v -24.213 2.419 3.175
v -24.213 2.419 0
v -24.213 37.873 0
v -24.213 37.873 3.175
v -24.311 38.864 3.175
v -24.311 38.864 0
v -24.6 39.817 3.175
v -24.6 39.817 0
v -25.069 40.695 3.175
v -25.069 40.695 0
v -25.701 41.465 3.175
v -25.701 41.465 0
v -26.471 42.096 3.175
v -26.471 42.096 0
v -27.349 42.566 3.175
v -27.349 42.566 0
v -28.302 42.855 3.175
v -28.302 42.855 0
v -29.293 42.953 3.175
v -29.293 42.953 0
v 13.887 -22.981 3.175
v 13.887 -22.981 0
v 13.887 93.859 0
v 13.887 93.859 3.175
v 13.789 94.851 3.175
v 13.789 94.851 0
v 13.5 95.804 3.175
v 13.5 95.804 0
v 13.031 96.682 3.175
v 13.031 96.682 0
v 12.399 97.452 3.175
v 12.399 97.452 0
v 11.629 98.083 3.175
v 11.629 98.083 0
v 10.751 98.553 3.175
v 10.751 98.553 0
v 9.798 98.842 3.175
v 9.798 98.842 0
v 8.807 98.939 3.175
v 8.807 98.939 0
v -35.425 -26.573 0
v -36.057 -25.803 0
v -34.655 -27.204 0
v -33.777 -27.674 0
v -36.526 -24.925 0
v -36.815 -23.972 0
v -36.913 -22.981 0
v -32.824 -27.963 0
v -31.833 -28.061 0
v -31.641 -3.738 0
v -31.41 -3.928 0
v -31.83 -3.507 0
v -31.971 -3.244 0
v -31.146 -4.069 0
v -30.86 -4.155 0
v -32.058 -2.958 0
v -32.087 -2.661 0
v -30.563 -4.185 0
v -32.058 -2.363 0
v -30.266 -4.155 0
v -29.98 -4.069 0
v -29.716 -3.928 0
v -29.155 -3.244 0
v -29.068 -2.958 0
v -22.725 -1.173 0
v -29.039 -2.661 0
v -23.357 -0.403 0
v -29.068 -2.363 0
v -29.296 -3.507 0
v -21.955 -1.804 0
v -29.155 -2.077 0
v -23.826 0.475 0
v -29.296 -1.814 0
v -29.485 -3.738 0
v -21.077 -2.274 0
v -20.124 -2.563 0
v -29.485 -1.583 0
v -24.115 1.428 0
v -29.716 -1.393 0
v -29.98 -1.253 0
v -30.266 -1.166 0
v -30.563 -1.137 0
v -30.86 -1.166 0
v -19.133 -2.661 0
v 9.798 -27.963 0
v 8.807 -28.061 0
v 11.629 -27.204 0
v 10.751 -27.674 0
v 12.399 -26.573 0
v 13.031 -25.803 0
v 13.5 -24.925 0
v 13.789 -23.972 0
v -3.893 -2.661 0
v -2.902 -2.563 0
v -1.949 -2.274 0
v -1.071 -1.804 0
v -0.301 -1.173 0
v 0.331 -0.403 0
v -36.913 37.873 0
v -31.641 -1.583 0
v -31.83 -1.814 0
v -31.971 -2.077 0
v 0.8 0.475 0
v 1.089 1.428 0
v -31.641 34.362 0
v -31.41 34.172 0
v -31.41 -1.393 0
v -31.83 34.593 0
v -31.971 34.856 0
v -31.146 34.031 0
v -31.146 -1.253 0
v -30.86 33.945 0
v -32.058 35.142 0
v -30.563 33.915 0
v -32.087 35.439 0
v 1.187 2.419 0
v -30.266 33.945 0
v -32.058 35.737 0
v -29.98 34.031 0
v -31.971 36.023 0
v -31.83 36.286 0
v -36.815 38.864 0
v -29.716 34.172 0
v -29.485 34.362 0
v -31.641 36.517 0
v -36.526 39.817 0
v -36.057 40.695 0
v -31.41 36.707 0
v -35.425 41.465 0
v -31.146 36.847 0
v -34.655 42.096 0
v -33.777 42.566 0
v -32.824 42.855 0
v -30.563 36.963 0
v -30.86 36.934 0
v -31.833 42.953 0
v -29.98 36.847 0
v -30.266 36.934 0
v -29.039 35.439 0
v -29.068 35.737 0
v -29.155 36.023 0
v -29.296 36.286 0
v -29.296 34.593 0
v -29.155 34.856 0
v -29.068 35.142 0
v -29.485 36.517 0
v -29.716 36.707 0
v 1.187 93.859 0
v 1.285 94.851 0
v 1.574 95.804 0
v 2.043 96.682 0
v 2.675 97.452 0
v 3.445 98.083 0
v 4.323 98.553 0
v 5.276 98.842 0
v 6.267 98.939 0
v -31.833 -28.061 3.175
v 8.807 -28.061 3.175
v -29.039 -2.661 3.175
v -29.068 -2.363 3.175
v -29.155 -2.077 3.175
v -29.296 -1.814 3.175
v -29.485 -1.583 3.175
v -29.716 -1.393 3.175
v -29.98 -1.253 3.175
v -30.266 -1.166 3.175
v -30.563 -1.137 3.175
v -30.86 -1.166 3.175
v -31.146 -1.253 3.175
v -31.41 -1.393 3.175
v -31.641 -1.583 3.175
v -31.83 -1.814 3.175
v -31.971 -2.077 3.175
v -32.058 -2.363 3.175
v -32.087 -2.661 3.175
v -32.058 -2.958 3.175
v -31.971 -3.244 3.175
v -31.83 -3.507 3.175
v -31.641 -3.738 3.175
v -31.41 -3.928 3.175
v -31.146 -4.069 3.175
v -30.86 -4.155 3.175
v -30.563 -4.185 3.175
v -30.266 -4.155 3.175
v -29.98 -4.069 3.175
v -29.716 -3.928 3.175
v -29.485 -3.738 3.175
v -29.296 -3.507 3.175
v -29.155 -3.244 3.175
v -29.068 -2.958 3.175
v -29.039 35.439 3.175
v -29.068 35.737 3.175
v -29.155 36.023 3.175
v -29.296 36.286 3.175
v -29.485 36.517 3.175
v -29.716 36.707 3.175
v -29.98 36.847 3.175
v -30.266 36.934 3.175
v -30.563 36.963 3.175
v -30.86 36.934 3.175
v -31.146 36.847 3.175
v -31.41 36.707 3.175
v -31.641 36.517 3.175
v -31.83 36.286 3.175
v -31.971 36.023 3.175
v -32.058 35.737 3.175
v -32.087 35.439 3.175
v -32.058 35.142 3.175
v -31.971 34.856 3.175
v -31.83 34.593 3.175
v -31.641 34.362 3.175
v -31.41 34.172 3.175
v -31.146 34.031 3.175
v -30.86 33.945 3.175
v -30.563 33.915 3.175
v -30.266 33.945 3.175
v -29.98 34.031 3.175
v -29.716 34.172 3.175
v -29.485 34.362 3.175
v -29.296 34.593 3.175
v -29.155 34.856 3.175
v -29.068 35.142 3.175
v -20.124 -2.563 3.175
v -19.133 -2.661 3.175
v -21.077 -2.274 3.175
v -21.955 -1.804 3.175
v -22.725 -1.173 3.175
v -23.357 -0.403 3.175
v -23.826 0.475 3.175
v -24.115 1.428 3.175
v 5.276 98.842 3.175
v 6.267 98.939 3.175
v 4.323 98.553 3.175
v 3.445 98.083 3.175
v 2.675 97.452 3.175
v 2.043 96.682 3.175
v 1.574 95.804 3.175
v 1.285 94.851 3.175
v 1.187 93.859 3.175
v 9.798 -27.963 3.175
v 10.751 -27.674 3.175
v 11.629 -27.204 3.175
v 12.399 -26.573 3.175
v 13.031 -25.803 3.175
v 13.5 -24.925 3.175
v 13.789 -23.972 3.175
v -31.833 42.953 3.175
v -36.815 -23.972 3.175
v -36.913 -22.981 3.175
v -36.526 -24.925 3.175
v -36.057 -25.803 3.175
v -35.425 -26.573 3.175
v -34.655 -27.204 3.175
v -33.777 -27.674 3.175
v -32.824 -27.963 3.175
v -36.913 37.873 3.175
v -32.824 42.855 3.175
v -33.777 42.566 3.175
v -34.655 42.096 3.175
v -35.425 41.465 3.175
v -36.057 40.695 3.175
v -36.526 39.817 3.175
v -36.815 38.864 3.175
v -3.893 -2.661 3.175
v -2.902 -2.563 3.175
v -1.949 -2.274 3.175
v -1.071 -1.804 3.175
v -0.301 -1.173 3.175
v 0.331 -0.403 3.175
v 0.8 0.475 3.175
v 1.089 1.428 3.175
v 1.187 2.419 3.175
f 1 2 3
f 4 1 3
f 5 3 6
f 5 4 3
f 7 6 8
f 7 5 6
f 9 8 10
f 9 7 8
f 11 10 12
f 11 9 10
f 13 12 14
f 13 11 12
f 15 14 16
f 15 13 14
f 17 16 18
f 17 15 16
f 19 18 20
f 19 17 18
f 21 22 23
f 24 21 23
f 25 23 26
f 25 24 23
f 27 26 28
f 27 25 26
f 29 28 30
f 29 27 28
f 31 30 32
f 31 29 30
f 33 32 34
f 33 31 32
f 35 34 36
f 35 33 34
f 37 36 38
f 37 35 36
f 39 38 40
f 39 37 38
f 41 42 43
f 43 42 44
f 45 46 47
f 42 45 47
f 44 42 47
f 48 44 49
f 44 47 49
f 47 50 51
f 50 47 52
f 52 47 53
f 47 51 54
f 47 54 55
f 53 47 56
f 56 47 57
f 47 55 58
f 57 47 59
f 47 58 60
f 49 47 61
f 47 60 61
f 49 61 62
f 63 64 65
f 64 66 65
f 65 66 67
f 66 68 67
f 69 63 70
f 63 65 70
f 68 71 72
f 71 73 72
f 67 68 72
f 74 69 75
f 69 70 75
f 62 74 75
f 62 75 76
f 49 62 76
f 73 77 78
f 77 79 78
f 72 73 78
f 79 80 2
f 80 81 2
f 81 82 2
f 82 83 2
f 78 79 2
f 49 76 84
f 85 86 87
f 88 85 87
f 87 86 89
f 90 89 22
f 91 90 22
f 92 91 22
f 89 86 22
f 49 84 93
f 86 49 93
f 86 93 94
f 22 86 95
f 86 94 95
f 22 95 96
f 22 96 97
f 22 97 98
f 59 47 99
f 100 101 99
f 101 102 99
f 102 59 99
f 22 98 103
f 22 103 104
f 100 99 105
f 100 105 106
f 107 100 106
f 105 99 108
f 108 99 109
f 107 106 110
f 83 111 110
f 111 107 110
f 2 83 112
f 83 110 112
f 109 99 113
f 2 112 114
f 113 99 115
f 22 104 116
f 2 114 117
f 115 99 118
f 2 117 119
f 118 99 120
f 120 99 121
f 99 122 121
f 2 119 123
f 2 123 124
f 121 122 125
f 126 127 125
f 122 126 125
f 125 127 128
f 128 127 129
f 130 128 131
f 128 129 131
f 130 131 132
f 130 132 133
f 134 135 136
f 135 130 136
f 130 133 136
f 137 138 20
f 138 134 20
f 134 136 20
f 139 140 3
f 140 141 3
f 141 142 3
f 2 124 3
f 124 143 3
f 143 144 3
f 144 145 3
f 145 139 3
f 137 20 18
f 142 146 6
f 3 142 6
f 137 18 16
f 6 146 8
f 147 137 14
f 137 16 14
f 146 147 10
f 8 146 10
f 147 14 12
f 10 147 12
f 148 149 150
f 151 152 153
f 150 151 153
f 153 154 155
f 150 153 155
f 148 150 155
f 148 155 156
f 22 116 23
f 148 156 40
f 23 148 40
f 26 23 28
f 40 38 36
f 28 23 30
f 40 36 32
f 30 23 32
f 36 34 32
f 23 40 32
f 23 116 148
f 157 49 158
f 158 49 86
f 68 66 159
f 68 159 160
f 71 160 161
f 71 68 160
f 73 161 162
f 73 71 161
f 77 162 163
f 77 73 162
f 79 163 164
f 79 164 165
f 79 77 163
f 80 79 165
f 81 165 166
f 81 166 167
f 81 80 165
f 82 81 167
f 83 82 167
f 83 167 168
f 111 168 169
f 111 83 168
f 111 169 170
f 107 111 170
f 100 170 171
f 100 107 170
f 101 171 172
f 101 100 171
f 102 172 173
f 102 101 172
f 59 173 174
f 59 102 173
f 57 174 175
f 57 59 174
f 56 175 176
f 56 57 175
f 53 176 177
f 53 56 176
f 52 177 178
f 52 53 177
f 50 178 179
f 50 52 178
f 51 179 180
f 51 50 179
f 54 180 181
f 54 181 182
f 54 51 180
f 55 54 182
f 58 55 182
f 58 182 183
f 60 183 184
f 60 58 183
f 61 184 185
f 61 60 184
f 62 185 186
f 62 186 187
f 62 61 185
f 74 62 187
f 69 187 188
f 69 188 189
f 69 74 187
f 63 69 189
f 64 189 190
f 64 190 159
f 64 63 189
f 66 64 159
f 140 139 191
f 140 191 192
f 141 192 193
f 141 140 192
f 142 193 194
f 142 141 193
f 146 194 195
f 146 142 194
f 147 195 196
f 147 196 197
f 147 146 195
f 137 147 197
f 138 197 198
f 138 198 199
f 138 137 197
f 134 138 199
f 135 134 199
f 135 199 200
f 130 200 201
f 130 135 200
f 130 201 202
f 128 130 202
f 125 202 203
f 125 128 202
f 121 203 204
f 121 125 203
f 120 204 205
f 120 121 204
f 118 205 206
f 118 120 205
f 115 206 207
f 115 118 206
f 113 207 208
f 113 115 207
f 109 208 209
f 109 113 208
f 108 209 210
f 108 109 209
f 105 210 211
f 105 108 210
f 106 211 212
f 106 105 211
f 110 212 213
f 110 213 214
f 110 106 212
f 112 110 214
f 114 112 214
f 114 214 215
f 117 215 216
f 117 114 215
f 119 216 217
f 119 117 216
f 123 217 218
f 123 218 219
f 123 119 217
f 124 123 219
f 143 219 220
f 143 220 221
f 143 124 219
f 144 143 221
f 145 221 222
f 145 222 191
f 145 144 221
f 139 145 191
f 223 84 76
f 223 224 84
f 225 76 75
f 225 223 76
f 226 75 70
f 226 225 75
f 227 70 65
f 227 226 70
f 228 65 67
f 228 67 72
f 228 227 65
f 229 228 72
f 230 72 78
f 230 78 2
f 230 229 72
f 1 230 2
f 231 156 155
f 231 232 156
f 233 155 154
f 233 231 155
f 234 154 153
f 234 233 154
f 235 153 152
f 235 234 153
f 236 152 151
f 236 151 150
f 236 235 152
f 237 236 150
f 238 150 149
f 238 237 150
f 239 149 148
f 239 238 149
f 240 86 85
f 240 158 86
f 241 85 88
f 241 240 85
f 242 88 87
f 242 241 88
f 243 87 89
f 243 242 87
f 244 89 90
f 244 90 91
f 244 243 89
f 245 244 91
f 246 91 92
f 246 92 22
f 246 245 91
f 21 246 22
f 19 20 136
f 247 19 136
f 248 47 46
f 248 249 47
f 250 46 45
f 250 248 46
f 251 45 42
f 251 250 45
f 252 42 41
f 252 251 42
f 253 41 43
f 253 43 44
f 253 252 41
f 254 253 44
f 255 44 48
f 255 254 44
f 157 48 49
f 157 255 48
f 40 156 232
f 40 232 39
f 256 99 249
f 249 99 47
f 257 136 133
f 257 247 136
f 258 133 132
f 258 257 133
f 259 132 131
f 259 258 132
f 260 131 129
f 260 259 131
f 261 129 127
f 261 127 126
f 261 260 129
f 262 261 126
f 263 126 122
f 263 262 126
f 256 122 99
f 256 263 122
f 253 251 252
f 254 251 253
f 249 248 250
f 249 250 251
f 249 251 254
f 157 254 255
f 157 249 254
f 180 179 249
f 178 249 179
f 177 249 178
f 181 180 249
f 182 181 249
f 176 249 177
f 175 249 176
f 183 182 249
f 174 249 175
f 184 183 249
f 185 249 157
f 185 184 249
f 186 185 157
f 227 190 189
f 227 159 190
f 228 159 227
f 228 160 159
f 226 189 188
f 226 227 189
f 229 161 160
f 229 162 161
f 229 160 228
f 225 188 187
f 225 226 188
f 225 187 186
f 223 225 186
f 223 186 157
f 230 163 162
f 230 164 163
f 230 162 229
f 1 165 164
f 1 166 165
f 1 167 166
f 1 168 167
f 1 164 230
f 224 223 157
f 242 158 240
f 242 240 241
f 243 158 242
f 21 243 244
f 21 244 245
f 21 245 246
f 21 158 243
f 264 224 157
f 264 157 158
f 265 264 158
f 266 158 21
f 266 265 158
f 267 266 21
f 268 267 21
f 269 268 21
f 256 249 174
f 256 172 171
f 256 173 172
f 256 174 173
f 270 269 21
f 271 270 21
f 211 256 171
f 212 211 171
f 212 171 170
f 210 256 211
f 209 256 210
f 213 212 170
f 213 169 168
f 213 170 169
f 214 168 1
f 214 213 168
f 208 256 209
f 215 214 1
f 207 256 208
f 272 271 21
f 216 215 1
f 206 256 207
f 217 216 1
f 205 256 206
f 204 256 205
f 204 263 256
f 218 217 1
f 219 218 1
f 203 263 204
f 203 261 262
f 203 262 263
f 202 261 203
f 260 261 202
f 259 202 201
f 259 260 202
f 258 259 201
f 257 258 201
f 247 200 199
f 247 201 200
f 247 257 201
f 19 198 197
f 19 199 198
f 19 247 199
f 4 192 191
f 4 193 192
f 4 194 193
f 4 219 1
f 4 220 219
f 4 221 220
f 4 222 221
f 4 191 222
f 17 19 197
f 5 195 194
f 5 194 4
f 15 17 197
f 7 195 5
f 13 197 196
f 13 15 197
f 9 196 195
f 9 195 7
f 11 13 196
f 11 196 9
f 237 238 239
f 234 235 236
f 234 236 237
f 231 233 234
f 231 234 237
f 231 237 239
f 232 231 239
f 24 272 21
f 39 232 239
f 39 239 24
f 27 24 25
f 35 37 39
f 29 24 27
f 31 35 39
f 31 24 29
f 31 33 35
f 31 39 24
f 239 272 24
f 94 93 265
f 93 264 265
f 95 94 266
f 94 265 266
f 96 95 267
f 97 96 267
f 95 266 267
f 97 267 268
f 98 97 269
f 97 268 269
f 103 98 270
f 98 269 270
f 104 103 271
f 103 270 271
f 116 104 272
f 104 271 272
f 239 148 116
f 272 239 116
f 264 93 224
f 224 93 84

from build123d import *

# Parameters (mm, degrees)
F0_R     = 1.524
F0_W     = 12.7
F0_H     = 25.4
F1_DEPTH = 3.175
F2_R     = 5.08


with BuildPart() as f1:
    # F0 (on Top) → F1 (new body)
    with BuildSketch(Plane.XY):
        Polygon((1.1870916933, -2.6605168543), (-24.2129083067, -2.6605168543), (-24.2129083067, 42.9525971413), (-36.9129083067, 42.9525971413), (-36.9129083067, -2.6605168543), (-36.9129083067, -12.0184096301), (-36.9129083067, -28.0605168543), (13.8870916933, -28.0605168543), (13.8870916933, -12.0184096301), (13.8870916933, -2.6605168543), (13.8870916933, 73.5394831457), (1.1870916933, 73.5394831457), align=None)
        with Locations((-30.5629083067, -2.6605168543)):
            Circle(F0_R, mode=Mode.SUBTRACT)
        with Locations((-30.5629083067, 35.4394831457)):
            Circle(F0_R, mode=Mode.SUBTRACT)
        with Locations((7.5370916933, 86.2394831457)):
            Rectangle(F0_W, F0_H)
    extrude(amount=F1_DEPTH)

    # F2
    f2_edges = [f1.edges().sort_by_distance(p)[0] for p in [
        (-36.912908, 42.952597, 1.5875),
        (1.187092, -2.660517, 1.5875),
        (-36.912908, -28.060517, 1.5875),
        (13.887092, -28.060517, 1.5875),
        (-24.212908, -2.660517, 1.5875),
        (1.187092, 98.939483, 1.5875),
        (13.887092, 98.939483, 1.5875),
        (-24.212908, 42.952597, 1.5875),
    ]]
    fillet(f2_edges, radius=F2_R)


solid = f1.part
